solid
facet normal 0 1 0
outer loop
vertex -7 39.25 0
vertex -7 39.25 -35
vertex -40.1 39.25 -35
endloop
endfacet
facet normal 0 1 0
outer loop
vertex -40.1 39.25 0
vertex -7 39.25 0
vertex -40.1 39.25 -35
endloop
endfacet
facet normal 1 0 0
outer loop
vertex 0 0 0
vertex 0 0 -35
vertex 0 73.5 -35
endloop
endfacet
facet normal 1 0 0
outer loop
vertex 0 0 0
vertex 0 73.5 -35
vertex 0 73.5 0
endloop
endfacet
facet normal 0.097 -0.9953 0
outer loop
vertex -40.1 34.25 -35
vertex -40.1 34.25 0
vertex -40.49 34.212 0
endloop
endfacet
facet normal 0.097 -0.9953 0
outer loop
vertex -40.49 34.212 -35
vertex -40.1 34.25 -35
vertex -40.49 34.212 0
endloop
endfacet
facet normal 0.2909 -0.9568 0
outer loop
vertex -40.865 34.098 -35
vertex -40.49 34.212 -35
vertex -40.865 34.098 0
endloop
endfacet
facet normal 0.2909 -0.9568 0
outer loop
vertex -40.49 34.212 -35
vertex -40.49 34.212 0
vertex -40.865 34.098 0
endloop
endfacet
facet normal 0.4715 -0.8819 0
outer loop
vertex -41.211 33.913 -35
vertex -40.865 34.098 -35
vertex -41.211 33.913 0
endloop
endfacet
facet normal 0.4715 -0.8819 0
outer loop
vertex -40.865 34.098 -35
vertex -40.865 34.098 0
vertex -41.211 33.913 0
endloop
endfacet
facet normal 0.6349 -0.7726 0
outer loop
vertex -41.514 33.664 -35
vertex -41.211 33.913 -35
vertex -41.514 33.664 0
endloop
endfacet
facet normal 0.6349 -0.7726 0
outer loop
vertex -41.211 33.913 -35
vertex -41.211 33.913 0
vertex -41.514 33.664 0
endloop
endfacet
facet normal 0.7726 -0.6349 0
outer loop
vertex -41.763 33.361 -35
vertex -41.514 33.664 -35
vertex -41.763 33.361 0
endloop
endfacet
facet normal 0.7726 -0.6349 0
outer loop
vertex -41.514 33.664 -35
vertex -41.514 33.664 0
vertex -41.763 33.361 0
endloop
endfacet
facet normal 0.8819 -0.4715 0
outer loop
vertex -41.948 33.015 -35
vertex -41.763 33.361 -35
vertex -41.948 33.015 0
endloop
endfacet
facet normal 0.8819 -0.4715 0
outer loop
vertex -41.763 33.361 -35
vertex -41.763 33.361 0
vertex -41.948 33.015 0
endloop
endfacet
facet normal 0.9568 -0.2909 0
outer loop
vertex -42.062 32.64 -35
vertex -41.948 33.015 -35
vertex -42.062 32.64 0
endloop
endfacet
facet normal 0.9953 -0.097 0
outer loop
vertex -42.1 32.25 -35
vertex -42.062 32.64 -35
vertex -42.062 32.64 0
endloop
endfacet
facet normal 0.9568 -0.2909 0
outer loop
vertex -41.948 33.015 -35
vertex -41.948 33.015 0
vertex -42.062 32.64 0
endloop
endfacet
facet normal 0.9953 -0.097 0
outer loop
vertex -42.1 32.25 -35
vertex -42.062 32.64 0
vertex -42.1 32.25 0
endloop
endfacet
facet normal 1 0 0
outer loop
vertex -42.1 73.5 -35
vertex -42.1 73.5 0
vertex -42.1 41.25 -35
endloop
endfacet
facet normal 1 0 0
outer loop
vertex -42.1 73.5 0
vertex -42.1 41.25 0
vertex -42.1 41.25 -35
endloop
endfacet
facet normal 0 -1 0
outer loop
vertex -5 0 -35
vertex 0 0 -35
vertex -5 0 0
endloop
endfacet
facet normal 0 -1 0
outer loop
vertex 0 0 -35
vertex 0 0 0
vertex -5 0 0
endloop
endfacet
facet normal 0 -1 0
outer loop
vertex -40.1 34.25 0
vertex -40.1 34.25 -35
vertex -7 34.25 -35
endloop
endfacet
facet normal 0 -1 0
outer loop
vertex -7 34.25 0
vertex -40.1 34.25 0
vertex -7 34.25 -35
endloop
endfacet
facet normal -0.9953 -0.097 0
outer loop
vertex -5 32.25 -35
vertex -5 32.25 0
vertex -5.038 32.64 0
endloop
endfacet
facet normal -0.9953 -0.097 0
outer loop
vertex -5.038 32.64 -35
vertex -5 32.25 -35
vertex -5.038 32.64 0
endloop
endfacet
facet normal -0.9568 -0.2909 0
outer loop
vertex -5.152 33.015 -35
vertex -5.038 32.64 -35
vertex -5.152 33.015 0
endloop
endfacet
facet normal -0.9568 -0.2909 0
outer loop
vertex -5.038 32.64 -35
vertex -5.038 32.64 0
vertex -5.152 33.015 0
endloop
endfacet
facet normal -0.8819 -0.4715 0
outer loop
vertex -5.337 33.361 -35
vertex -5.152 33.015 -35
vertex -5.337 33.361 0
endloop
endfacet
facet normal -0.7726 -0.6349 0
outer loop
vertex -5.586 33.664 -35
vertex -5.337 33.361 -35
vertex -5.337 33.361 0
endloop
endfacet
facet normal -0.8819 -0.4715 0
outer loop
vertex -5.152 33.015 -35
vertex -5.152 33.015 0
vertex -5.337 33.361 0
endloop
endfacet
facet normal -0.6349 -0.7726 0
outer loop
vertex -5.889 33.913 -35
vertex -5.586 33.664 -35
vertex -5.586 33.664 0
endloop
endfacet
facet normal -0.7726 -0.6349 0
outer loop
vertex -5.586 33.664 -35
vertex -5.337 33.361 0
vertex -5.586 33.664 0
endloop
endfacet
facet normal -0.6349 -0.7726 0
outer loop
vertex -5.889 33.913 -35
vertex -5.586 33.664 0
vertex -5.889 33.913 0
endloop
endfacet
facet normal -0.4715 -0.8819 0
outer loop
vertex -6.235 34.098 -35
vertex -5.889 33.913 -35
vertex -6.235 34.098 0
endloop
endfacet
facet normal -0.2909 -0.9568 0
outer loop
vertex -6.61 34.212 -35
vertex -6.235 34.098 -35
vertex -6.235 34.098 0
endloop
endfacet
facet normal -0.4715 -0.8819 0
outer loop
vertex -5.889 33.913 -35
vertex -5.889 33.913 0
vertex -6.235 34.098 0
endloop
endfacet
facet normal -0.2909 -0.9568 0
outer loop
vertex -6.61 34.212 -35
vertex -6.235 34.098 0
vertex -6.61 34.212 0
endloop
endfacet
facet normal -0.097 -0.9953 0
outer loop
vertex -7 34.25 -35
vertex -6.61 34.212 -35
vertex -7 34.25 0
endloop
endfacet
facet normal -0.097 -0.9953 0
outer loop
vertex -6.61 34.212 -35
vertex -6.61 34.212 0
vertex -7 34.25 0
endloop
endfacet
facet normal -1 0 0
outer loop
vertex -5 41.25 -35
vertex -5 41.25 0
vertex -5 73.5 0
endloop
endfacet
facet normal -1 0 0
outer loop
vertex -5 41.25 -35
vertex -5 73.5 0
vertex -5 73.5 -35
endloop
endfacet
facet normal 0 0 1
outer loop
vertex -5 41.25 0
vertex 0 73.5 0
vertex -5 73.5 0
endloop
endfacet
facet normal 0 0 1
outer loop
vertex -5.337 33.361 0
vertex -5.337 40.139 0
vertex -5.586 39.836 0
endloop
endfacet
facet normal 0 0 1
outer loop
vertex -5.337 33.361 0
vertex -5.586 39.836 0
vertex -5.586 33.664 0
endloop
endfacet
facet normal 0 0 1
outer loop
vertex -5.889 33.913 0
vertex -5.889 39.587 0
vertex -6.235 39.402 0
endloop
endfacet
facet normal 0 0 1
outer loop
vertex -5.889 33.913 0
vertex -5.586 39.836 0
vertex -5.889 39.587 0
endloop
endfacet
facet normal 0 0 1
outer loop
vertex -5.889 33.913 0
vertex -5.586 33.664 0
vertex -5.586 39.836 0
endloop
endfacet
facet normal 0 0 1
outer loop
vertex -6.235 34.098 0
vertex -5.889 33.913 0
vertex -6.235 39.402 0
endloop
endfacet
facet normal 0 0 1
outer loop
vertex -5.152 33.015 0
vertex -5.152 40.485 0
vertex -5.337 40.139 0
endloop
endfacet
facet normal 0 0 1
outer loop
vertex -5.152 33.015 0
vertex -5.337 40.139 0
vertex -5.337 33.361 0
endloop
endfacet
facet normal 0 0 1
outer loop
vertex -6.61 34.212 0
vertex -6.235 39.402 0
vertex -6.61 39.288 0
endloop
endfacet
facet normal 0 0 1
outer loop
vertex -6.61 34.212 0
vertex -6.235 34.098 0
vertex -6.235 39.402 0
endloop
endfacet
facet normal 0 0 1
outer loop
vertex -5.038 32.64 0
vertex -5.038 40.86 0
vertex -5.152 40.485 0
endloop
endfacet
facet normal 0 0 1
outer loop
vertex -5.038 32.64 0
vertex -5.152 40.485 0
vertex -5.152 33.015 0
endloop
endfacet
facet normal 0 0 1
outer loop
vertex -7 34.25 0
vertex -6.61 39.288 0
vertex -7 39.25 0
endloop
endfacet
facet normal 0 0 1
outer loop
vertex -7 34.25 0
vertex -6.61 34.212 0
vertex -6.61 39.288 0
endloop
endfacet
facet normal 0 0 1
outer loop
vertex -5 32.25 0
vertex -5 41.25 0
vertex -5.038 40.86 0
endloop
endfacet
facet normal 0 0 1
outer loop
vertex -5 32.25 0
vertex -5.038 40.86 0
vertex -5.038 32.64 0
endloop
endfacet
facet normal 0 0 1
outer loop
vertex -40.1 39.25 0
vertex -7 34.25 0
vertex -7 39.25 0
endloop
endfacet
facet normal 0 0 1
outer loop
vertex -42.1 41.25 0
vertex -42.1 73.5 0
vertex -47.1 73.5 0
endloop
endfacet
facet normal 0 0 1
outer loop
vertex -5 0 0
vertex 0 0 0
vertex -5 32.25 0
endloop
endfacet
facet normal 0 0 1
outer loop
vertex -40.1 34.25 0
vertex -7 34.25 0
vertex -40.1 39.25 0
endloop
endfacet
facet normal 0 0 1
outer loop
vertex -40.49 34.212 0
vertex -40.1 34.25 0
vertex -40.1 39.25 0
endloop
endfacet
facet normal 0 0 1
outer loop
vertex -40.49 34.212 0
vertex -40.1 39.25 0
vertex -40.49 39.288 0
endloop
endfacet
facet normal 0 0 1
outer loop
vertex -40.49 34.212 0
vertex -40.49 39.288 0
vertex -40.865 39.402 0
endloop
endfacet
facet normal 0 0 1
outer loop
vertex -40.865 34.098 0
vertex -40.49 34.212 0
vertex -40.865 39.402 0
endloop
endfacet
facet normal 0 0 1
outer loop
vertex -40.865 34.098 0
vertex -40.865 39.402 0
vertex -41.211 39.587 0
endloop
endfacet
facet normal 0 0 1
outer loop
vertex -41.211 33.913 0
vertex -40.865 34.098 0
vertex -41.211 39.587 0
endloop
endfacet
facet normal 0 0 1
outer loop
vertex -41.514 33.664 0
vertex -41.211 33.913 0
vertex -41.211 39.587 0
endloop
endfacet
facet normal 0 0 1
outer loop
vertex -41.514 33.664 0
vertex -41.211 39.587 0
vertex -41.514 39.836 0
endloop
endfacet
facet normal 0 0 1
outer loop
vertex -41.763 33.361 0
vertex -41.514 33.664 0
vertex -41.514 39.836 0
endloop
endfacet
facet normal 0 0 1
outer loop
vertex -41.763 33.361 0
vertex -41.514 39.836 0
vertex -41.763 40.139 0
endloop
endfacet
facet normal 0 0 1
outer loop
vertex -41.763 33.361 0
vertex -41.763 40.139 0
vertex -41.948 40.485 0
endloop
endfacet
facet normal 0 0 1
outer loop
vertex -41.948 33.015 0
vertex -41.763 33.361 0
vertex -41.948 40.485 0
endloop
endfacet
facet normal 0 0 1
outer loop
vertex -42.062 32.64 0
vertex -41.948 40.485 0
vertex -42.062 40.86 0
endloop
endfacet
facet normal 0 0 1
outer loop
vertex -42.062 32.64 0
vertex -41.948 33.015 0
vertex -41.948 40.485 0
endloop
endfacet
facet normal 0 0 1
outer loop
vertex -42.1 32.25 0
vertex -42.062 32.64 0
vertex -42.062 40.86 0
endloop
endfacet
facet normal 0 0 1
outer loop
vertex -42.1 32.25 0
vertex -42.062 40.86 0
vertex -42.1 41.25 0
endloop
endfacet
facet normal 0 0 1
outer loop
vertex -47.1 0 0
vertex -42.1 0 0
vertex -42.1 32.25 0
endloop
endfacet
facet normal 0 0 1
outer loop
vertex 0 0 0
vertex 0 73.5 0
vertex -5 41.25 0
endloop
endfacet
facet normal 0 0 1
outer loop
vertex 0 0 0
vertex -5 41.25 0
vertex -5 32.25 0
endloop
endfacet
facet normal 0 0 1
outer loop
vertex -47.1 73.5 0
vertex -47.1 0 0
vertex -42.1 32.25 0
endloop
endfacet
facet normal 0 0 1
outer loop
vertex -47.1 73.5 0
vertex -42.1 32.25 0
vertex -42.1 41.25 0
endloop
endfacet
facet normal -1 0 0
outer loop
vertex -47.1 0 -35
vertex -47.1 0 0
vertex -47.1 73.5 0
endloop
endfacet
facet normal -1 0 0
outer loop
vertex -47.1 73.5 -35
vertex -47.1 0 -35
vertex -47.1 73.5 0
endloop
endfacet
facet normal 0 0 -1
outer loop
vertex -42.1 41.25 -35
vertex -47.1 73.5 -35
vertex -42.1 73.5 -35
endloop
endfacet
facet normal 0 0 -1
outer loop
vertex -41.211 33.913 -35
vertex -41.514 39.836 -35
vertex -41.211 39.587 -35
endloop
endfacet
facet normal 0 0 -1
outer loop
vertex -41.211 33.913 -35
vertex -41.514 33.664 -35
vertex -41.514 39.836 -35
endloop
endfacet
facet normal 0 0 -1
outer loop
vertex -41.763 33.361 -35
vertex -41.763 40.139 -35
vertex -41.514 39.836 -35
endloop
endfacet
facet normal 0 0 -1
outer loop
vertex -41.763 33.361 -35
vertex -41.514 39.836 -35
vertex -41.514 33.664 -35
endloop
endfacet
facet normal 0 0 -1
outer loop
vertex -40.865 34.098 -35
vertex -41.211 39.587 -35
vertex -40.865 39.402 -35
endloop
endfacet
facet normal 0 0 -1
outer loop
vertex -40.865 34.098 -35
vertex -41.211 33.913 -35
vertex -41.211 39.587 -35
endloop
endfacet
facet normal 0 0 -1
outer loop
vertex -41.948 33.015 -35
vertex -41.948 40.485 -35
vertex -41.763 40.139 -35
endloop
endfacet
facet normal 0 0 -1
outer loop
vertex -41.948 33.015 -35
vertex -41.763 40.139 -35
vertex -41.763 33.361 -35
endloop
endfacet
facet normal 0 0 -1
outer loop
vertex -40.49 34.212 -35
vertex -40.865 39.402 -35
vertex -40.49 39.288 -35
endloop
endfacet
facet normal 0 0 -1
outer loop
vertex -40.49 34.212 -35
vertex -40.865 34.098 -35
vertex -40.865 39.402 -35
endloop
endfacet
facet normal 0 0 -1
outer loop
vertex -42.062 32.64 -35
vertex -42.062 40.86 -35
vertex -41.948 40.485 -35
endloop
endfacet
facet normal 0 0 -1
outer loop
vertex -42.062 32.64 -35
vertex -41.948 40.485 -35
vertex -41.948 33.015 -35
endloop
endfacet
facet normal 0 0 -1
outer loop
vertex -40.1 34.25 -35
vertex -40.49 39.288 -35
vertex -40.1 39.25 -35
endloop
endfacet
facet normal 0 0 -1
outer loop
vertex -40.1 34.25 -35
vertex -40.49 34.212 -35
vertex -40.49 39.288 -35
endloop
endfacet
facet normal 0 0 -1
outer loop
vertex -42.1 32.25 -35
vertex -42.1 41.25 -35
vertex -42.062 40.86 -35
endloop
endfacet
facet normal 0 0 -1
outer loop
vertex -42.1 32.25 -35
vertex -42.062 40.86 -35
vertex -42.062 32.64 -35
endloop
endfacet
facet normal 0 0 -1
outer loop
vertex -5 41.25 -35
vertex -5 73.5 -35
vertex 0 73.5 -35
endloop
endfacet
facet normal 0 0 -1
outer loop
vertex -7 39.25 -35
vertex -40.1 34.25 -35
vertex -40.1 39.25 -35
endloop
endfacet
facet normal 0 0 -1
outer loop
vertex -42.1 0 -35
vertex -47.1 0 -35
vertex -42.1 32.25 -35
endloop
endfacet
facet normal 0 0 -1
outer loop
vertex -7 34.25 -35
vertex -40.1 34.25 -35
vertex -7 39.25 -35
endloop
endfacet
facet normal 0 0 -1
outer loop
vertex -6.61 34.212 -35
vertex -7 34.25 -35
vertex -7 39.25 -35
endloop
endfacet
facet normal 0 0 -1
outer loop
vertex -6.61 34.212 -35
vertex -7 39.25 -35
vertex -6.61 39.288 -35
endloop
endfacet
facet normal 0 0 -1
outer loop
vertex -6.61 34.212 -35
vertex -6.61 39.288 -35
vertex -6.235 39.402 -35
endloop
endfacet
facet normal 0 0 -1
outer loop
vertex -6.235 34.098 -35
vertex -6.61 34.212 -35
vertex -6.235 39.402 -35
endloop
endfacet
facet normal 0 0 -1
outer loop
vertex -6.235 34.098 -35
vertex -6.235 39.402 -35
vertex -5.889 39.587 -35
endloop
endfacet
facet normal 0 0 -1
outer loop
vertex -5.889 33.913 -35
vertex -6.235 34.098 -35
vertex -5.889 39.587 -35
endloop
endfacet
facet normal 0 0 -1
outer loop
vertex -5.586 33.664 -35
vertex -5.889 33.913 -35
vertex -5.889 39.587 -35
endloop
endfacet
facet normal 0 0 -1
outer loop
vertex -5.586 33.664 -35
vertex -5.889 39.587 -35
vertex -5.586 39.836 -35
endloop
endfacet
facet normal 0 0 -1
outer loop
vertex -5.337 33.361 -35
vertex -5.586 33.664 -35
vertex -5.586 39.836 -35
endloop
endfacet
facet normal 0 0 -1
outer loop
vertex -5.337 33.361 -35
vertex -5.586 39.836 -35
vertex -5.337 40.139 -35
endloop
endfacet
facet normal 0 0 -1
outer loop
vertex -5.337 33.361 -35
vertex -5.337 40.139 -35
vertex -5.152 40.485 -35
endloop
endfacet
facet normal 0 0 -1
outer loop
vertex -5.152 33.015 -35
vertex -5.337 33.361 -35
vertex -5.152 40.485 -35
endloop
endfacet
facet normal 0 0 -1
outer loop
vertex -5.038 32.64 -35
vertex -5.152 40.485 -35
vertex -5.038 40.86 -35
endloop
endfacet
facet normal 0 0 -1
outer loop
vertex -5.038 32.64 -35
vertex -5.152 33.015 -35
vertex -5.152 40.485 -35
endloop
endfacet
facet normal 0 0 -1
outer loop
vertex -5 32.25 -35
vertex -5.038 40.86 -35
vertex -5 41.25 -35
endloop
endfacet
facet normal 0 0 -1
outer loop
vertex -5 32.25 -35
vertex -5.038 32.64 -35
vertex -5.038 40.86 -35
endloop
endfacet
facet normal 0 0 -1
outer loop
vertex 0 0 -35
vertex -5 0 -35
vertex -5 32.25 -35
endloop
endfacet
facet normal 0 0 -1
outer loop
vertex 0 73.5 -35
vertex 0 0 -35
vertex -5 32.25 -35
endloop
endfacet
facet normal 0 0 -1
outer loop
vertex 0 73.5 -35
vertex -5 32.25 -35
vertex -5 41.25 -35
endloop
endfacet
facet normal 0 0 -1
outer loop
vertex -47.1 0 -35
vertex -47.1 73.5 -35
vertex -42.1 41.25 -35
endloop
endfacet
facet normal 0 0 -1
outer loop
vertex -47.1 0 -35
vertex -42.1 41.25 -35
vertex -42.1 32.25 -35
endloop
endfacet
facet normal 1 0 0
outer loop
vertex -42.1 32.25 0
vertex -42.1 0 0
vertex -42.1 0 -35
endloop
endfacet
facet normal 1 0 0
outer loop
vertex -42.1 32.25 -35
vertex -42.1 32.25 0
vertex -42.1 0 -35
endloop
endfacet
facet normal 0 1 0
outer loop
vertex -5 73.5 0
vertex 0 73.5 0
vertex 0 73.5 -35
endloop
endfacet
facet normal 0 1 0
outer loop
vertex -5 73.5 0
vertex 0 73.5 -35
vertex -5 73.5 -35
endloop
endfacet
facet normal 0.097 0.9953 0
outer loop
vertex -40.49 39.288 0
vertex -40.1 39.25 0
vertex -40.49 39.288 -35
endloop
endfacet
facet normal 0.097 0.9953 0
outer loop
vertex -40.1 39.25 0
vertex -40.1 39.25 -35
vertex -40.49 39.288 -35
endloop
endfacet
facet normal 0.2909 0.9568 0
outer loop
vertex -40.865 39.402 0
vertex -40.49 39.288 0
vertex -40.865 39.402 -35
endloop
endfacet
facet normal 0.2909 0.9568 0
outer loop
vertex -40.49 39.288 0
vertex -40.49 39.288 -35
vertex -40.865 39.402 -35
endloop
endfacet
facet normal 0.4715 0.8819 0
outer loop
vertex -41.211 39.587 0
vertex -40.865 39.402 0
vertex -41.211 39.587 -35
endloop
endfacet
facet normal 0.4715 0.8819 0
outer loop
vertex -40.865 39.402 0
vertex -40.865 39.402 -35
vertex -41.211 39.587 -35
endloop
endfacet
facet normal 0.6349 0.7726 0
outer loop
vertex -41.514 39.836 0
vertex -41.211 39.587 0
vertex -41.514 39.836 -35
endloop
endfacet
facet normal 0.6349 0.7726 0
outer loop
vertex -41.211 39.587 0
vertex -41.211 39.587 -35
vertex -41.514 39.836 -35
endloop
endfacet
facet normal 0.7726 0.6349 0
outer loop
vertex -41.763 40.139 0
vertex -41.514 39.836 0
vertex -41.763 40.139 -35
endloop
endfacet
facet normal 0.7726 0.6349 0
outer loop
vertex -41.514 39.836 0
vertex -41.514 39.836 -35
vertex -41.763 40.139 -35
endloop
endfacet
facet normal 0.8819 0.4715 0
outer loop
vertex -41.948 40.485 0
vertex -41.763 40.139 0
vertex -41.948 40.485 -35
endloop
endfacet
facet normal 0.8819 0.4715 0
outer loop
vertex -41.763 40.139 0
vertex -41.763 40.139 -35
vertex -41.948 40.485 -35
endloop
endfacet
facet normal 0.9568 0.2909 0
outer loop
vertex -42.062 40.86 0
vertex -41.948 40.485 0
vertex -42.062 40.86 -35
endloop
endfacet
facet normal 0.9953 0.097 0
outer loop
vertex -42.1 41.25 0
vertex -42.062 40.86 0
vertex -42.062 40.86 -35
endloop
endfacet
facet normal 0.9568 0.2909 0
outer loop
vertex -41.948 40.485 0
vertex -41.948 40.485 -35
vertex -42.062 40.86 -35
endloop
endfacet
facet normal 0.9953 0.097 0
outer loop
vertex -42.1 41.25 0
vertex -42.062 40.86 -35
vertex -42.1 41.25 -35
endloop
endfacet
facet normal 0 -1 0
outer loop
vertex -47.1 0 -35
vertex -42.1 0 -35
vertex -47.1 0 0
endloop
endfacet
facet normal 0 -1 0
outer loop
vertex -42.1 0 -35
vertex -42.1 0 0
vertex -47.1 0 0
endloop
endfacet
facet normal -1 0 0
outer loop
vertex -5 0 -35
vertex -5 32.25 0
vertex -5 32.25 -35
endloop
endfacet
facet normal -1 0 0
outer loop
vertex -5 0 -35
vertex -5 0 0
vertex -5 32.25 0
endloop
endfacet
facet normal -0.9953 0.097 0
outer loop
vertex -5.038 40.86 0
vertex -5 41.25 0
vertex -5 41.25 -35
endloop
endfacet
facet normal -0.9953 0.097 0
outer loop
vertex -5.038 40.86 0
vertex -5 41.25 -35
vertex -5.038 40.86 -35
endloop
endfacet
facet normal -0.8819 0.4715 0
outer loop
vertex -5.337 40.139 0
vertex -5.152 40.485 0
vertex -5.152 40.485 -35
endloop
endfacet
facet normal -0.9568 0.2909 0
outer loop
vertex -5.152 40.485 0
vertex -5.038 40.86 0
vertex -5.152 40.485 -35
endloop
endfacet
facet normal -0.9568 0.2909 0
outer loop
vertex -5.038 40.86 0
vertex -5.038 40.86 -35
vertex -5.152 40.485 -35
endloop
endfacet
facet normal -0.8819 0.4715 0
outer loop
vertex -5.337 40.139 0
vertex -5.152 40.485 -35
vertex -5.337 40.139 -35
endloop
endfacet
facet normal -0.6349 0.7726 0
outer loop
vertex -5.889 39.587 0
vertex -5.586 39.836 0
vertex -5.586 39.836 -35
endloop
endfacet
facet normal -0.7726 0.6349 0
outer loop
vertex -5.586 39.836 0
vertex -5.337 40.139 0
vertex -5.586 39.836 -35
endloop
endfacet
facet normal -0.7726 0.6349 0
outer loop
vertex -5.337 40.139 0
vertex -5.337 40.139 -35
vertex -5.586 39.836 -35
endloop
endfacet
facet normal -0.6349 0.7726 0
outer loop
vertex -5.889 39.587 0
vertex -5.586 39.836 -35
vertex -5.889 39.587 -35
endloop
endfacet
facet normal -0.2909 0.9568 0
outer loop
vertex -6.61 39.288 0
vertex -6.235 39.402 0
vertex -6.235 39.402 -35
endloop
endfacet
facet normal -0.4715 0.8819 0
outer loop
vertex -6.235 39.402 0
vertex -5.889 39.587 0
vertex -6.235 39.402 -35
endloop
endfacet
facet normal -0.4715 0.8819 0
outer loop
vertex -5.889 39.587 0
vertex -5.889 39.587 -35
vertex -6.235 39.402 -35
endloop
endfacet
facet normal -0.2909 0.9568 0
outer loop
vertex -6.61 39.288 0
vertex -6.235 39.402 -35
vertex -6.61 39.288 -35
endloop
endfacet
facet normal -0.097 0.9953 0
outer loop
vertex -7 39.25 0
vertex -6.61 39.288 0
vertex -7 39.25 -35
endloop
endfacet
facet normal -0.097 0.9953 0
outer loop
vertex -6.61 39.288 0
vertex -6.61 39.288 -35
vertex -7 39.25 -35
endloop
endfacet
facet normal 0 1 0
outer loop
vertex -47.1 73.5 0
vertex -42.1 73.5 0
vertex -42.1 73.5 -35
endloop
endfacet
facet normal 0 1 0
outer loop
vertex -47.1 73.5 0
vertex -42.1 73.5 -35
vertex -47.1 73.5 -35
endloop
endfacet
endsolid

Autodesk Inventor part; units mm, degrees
ref_plane "YZ Plane" through (0, 0, 0) normal (1, 0, 0) x (0, 1, 0)
ref_plane "XZ Plane" through (0, 0, 0) normal (0, 1, 0) x (-1, 0, 0)
ref_plane "XY Plane" through (0, 0, 0) normal (0, 0, 1) x (1, 0, 0)
sketch "Sketch1" plane through (0, 0, 0) normal (0, 1, 0) x (-1, 0, 0)
  line L0 (0, 0) -> (47.1, 0)
  line L1 (47.1, 0) -> (47.1, -35)
  line L2 (47.1, -35) -> (0, -35)
  line L3 (0, -35) -> (0, 0)
  line L4 (47.1, 0) -> (42.1, 0)
  line L5 (42.1, 0) -> (42.1, -35)
  line L6 (42.1, -35) -> (47.1, -35)
  line L7 (47.1, -35) -> (47.1, 0)
  line L8 (42.1, -15) -> (5, -15)
  line L9 (0, -11) -> (0, -16)
  line L10 (5, -20) -> (42.1, -20)
  line L11 (42.1, -20) -> (42.1, -15)
  line L12 (0, 0) -> (5, 0)
  line L13 (5, 0) -> (5, -35)
  line L14 (5, -35) -> (0, -35)
  line L15 (0, -35) -> (0, 0)
  dimension "d0" = 47.1
  dimension "d1" = 35
  dimension "d2" = 5
  dimension "d3" = 5
  dimension "d4" = 15
  dimension "d6" = 5
  dimension "d7" = 35
  dimension "d15" = 15
extrude "Extrusion1" add sketch "Sketch1" along normal blind 73.5 contours L0 L13 L2 L3 | L0 L1 L2 L5
sketch "Sketch2" plane through (-47.1, 0, 0) normal (0, 0, 1) x (1, 0, 0)
  line L0 (0, 0) -> (5, 0) projected
  line L1 (5, 0) -> (5, 73.5) projected
  line L2 (0, 73.5) -> (5, 73.5) projected
  line L3 (0, 0) -> (0, 73.5) projected
  line L4 (42.1, 0) -> (47.1, 0) projected
  line L5 (47.1, 0) -> (47.1, 73.5) projected
  line L6 (42.1, 73.5) -> (47.1, 73.5) projected
  line L7 (42.1, 0) -> (42.1, 73.5) projected
  line L8 (5, 0) -> (5, 73.5) projected
  line L9 (42.1, 0) -> (42.1, 73.5) projected
  line L10 (42.1, 15.5) -> (42.1, 10.5)
  line L11 (5, 10.5) -> (5, 15.5)
  line L12 (47.1, 0) -> (47.1, 73.5) projected
  line L13 (0, 0) -> (0, 73.5) projected
  line L14 (47.1, 39.25) -> (0, 39.25)
  line L15 (0, 39.25) -> (0, 34.25)
  line L16 (0, 34.25) -> (47.1, 34.25)
  line L17 (47.1, 34.25) -> (47.1, 39.25)
  dimension "d10" = 5
  dimension "d16" = 5
  dimension "d17" = 34.25
sketch "Sketch3" plane through (0, 0, 0) normal (0, -1, 0) x (1, 0, 0)
  line L0 (-43.6752, -16.6981) -> (-43.6752, -10.5412) construction
  line L1 (-43.6752, -10.5412) -> (-38.9883, -10.5412) construction
  line L2 (-38.9883, -10.5412) -> (-38.9883, -16.6981) construction
  line L3 (-38.9883, -16.6981) -> (-43.6752, -16.6981) construction
  point P0 (0, 0)
extrude "Extrusion3" add sketch "Sketch2" against normal blind 35 contours L3 L14 L1 L16 | L1 L14 L7 L16 | L7 L14 L5 L16
fillet "Fillet2" radius 2 4 edges at (-5, 34.25, -17.5) (-42.1, 34.25, -17.5) (-5, 39.25, -17.5) (-42.1, 39.25, -17.5)
properties part number "150x0y0z_0x0y0z"
